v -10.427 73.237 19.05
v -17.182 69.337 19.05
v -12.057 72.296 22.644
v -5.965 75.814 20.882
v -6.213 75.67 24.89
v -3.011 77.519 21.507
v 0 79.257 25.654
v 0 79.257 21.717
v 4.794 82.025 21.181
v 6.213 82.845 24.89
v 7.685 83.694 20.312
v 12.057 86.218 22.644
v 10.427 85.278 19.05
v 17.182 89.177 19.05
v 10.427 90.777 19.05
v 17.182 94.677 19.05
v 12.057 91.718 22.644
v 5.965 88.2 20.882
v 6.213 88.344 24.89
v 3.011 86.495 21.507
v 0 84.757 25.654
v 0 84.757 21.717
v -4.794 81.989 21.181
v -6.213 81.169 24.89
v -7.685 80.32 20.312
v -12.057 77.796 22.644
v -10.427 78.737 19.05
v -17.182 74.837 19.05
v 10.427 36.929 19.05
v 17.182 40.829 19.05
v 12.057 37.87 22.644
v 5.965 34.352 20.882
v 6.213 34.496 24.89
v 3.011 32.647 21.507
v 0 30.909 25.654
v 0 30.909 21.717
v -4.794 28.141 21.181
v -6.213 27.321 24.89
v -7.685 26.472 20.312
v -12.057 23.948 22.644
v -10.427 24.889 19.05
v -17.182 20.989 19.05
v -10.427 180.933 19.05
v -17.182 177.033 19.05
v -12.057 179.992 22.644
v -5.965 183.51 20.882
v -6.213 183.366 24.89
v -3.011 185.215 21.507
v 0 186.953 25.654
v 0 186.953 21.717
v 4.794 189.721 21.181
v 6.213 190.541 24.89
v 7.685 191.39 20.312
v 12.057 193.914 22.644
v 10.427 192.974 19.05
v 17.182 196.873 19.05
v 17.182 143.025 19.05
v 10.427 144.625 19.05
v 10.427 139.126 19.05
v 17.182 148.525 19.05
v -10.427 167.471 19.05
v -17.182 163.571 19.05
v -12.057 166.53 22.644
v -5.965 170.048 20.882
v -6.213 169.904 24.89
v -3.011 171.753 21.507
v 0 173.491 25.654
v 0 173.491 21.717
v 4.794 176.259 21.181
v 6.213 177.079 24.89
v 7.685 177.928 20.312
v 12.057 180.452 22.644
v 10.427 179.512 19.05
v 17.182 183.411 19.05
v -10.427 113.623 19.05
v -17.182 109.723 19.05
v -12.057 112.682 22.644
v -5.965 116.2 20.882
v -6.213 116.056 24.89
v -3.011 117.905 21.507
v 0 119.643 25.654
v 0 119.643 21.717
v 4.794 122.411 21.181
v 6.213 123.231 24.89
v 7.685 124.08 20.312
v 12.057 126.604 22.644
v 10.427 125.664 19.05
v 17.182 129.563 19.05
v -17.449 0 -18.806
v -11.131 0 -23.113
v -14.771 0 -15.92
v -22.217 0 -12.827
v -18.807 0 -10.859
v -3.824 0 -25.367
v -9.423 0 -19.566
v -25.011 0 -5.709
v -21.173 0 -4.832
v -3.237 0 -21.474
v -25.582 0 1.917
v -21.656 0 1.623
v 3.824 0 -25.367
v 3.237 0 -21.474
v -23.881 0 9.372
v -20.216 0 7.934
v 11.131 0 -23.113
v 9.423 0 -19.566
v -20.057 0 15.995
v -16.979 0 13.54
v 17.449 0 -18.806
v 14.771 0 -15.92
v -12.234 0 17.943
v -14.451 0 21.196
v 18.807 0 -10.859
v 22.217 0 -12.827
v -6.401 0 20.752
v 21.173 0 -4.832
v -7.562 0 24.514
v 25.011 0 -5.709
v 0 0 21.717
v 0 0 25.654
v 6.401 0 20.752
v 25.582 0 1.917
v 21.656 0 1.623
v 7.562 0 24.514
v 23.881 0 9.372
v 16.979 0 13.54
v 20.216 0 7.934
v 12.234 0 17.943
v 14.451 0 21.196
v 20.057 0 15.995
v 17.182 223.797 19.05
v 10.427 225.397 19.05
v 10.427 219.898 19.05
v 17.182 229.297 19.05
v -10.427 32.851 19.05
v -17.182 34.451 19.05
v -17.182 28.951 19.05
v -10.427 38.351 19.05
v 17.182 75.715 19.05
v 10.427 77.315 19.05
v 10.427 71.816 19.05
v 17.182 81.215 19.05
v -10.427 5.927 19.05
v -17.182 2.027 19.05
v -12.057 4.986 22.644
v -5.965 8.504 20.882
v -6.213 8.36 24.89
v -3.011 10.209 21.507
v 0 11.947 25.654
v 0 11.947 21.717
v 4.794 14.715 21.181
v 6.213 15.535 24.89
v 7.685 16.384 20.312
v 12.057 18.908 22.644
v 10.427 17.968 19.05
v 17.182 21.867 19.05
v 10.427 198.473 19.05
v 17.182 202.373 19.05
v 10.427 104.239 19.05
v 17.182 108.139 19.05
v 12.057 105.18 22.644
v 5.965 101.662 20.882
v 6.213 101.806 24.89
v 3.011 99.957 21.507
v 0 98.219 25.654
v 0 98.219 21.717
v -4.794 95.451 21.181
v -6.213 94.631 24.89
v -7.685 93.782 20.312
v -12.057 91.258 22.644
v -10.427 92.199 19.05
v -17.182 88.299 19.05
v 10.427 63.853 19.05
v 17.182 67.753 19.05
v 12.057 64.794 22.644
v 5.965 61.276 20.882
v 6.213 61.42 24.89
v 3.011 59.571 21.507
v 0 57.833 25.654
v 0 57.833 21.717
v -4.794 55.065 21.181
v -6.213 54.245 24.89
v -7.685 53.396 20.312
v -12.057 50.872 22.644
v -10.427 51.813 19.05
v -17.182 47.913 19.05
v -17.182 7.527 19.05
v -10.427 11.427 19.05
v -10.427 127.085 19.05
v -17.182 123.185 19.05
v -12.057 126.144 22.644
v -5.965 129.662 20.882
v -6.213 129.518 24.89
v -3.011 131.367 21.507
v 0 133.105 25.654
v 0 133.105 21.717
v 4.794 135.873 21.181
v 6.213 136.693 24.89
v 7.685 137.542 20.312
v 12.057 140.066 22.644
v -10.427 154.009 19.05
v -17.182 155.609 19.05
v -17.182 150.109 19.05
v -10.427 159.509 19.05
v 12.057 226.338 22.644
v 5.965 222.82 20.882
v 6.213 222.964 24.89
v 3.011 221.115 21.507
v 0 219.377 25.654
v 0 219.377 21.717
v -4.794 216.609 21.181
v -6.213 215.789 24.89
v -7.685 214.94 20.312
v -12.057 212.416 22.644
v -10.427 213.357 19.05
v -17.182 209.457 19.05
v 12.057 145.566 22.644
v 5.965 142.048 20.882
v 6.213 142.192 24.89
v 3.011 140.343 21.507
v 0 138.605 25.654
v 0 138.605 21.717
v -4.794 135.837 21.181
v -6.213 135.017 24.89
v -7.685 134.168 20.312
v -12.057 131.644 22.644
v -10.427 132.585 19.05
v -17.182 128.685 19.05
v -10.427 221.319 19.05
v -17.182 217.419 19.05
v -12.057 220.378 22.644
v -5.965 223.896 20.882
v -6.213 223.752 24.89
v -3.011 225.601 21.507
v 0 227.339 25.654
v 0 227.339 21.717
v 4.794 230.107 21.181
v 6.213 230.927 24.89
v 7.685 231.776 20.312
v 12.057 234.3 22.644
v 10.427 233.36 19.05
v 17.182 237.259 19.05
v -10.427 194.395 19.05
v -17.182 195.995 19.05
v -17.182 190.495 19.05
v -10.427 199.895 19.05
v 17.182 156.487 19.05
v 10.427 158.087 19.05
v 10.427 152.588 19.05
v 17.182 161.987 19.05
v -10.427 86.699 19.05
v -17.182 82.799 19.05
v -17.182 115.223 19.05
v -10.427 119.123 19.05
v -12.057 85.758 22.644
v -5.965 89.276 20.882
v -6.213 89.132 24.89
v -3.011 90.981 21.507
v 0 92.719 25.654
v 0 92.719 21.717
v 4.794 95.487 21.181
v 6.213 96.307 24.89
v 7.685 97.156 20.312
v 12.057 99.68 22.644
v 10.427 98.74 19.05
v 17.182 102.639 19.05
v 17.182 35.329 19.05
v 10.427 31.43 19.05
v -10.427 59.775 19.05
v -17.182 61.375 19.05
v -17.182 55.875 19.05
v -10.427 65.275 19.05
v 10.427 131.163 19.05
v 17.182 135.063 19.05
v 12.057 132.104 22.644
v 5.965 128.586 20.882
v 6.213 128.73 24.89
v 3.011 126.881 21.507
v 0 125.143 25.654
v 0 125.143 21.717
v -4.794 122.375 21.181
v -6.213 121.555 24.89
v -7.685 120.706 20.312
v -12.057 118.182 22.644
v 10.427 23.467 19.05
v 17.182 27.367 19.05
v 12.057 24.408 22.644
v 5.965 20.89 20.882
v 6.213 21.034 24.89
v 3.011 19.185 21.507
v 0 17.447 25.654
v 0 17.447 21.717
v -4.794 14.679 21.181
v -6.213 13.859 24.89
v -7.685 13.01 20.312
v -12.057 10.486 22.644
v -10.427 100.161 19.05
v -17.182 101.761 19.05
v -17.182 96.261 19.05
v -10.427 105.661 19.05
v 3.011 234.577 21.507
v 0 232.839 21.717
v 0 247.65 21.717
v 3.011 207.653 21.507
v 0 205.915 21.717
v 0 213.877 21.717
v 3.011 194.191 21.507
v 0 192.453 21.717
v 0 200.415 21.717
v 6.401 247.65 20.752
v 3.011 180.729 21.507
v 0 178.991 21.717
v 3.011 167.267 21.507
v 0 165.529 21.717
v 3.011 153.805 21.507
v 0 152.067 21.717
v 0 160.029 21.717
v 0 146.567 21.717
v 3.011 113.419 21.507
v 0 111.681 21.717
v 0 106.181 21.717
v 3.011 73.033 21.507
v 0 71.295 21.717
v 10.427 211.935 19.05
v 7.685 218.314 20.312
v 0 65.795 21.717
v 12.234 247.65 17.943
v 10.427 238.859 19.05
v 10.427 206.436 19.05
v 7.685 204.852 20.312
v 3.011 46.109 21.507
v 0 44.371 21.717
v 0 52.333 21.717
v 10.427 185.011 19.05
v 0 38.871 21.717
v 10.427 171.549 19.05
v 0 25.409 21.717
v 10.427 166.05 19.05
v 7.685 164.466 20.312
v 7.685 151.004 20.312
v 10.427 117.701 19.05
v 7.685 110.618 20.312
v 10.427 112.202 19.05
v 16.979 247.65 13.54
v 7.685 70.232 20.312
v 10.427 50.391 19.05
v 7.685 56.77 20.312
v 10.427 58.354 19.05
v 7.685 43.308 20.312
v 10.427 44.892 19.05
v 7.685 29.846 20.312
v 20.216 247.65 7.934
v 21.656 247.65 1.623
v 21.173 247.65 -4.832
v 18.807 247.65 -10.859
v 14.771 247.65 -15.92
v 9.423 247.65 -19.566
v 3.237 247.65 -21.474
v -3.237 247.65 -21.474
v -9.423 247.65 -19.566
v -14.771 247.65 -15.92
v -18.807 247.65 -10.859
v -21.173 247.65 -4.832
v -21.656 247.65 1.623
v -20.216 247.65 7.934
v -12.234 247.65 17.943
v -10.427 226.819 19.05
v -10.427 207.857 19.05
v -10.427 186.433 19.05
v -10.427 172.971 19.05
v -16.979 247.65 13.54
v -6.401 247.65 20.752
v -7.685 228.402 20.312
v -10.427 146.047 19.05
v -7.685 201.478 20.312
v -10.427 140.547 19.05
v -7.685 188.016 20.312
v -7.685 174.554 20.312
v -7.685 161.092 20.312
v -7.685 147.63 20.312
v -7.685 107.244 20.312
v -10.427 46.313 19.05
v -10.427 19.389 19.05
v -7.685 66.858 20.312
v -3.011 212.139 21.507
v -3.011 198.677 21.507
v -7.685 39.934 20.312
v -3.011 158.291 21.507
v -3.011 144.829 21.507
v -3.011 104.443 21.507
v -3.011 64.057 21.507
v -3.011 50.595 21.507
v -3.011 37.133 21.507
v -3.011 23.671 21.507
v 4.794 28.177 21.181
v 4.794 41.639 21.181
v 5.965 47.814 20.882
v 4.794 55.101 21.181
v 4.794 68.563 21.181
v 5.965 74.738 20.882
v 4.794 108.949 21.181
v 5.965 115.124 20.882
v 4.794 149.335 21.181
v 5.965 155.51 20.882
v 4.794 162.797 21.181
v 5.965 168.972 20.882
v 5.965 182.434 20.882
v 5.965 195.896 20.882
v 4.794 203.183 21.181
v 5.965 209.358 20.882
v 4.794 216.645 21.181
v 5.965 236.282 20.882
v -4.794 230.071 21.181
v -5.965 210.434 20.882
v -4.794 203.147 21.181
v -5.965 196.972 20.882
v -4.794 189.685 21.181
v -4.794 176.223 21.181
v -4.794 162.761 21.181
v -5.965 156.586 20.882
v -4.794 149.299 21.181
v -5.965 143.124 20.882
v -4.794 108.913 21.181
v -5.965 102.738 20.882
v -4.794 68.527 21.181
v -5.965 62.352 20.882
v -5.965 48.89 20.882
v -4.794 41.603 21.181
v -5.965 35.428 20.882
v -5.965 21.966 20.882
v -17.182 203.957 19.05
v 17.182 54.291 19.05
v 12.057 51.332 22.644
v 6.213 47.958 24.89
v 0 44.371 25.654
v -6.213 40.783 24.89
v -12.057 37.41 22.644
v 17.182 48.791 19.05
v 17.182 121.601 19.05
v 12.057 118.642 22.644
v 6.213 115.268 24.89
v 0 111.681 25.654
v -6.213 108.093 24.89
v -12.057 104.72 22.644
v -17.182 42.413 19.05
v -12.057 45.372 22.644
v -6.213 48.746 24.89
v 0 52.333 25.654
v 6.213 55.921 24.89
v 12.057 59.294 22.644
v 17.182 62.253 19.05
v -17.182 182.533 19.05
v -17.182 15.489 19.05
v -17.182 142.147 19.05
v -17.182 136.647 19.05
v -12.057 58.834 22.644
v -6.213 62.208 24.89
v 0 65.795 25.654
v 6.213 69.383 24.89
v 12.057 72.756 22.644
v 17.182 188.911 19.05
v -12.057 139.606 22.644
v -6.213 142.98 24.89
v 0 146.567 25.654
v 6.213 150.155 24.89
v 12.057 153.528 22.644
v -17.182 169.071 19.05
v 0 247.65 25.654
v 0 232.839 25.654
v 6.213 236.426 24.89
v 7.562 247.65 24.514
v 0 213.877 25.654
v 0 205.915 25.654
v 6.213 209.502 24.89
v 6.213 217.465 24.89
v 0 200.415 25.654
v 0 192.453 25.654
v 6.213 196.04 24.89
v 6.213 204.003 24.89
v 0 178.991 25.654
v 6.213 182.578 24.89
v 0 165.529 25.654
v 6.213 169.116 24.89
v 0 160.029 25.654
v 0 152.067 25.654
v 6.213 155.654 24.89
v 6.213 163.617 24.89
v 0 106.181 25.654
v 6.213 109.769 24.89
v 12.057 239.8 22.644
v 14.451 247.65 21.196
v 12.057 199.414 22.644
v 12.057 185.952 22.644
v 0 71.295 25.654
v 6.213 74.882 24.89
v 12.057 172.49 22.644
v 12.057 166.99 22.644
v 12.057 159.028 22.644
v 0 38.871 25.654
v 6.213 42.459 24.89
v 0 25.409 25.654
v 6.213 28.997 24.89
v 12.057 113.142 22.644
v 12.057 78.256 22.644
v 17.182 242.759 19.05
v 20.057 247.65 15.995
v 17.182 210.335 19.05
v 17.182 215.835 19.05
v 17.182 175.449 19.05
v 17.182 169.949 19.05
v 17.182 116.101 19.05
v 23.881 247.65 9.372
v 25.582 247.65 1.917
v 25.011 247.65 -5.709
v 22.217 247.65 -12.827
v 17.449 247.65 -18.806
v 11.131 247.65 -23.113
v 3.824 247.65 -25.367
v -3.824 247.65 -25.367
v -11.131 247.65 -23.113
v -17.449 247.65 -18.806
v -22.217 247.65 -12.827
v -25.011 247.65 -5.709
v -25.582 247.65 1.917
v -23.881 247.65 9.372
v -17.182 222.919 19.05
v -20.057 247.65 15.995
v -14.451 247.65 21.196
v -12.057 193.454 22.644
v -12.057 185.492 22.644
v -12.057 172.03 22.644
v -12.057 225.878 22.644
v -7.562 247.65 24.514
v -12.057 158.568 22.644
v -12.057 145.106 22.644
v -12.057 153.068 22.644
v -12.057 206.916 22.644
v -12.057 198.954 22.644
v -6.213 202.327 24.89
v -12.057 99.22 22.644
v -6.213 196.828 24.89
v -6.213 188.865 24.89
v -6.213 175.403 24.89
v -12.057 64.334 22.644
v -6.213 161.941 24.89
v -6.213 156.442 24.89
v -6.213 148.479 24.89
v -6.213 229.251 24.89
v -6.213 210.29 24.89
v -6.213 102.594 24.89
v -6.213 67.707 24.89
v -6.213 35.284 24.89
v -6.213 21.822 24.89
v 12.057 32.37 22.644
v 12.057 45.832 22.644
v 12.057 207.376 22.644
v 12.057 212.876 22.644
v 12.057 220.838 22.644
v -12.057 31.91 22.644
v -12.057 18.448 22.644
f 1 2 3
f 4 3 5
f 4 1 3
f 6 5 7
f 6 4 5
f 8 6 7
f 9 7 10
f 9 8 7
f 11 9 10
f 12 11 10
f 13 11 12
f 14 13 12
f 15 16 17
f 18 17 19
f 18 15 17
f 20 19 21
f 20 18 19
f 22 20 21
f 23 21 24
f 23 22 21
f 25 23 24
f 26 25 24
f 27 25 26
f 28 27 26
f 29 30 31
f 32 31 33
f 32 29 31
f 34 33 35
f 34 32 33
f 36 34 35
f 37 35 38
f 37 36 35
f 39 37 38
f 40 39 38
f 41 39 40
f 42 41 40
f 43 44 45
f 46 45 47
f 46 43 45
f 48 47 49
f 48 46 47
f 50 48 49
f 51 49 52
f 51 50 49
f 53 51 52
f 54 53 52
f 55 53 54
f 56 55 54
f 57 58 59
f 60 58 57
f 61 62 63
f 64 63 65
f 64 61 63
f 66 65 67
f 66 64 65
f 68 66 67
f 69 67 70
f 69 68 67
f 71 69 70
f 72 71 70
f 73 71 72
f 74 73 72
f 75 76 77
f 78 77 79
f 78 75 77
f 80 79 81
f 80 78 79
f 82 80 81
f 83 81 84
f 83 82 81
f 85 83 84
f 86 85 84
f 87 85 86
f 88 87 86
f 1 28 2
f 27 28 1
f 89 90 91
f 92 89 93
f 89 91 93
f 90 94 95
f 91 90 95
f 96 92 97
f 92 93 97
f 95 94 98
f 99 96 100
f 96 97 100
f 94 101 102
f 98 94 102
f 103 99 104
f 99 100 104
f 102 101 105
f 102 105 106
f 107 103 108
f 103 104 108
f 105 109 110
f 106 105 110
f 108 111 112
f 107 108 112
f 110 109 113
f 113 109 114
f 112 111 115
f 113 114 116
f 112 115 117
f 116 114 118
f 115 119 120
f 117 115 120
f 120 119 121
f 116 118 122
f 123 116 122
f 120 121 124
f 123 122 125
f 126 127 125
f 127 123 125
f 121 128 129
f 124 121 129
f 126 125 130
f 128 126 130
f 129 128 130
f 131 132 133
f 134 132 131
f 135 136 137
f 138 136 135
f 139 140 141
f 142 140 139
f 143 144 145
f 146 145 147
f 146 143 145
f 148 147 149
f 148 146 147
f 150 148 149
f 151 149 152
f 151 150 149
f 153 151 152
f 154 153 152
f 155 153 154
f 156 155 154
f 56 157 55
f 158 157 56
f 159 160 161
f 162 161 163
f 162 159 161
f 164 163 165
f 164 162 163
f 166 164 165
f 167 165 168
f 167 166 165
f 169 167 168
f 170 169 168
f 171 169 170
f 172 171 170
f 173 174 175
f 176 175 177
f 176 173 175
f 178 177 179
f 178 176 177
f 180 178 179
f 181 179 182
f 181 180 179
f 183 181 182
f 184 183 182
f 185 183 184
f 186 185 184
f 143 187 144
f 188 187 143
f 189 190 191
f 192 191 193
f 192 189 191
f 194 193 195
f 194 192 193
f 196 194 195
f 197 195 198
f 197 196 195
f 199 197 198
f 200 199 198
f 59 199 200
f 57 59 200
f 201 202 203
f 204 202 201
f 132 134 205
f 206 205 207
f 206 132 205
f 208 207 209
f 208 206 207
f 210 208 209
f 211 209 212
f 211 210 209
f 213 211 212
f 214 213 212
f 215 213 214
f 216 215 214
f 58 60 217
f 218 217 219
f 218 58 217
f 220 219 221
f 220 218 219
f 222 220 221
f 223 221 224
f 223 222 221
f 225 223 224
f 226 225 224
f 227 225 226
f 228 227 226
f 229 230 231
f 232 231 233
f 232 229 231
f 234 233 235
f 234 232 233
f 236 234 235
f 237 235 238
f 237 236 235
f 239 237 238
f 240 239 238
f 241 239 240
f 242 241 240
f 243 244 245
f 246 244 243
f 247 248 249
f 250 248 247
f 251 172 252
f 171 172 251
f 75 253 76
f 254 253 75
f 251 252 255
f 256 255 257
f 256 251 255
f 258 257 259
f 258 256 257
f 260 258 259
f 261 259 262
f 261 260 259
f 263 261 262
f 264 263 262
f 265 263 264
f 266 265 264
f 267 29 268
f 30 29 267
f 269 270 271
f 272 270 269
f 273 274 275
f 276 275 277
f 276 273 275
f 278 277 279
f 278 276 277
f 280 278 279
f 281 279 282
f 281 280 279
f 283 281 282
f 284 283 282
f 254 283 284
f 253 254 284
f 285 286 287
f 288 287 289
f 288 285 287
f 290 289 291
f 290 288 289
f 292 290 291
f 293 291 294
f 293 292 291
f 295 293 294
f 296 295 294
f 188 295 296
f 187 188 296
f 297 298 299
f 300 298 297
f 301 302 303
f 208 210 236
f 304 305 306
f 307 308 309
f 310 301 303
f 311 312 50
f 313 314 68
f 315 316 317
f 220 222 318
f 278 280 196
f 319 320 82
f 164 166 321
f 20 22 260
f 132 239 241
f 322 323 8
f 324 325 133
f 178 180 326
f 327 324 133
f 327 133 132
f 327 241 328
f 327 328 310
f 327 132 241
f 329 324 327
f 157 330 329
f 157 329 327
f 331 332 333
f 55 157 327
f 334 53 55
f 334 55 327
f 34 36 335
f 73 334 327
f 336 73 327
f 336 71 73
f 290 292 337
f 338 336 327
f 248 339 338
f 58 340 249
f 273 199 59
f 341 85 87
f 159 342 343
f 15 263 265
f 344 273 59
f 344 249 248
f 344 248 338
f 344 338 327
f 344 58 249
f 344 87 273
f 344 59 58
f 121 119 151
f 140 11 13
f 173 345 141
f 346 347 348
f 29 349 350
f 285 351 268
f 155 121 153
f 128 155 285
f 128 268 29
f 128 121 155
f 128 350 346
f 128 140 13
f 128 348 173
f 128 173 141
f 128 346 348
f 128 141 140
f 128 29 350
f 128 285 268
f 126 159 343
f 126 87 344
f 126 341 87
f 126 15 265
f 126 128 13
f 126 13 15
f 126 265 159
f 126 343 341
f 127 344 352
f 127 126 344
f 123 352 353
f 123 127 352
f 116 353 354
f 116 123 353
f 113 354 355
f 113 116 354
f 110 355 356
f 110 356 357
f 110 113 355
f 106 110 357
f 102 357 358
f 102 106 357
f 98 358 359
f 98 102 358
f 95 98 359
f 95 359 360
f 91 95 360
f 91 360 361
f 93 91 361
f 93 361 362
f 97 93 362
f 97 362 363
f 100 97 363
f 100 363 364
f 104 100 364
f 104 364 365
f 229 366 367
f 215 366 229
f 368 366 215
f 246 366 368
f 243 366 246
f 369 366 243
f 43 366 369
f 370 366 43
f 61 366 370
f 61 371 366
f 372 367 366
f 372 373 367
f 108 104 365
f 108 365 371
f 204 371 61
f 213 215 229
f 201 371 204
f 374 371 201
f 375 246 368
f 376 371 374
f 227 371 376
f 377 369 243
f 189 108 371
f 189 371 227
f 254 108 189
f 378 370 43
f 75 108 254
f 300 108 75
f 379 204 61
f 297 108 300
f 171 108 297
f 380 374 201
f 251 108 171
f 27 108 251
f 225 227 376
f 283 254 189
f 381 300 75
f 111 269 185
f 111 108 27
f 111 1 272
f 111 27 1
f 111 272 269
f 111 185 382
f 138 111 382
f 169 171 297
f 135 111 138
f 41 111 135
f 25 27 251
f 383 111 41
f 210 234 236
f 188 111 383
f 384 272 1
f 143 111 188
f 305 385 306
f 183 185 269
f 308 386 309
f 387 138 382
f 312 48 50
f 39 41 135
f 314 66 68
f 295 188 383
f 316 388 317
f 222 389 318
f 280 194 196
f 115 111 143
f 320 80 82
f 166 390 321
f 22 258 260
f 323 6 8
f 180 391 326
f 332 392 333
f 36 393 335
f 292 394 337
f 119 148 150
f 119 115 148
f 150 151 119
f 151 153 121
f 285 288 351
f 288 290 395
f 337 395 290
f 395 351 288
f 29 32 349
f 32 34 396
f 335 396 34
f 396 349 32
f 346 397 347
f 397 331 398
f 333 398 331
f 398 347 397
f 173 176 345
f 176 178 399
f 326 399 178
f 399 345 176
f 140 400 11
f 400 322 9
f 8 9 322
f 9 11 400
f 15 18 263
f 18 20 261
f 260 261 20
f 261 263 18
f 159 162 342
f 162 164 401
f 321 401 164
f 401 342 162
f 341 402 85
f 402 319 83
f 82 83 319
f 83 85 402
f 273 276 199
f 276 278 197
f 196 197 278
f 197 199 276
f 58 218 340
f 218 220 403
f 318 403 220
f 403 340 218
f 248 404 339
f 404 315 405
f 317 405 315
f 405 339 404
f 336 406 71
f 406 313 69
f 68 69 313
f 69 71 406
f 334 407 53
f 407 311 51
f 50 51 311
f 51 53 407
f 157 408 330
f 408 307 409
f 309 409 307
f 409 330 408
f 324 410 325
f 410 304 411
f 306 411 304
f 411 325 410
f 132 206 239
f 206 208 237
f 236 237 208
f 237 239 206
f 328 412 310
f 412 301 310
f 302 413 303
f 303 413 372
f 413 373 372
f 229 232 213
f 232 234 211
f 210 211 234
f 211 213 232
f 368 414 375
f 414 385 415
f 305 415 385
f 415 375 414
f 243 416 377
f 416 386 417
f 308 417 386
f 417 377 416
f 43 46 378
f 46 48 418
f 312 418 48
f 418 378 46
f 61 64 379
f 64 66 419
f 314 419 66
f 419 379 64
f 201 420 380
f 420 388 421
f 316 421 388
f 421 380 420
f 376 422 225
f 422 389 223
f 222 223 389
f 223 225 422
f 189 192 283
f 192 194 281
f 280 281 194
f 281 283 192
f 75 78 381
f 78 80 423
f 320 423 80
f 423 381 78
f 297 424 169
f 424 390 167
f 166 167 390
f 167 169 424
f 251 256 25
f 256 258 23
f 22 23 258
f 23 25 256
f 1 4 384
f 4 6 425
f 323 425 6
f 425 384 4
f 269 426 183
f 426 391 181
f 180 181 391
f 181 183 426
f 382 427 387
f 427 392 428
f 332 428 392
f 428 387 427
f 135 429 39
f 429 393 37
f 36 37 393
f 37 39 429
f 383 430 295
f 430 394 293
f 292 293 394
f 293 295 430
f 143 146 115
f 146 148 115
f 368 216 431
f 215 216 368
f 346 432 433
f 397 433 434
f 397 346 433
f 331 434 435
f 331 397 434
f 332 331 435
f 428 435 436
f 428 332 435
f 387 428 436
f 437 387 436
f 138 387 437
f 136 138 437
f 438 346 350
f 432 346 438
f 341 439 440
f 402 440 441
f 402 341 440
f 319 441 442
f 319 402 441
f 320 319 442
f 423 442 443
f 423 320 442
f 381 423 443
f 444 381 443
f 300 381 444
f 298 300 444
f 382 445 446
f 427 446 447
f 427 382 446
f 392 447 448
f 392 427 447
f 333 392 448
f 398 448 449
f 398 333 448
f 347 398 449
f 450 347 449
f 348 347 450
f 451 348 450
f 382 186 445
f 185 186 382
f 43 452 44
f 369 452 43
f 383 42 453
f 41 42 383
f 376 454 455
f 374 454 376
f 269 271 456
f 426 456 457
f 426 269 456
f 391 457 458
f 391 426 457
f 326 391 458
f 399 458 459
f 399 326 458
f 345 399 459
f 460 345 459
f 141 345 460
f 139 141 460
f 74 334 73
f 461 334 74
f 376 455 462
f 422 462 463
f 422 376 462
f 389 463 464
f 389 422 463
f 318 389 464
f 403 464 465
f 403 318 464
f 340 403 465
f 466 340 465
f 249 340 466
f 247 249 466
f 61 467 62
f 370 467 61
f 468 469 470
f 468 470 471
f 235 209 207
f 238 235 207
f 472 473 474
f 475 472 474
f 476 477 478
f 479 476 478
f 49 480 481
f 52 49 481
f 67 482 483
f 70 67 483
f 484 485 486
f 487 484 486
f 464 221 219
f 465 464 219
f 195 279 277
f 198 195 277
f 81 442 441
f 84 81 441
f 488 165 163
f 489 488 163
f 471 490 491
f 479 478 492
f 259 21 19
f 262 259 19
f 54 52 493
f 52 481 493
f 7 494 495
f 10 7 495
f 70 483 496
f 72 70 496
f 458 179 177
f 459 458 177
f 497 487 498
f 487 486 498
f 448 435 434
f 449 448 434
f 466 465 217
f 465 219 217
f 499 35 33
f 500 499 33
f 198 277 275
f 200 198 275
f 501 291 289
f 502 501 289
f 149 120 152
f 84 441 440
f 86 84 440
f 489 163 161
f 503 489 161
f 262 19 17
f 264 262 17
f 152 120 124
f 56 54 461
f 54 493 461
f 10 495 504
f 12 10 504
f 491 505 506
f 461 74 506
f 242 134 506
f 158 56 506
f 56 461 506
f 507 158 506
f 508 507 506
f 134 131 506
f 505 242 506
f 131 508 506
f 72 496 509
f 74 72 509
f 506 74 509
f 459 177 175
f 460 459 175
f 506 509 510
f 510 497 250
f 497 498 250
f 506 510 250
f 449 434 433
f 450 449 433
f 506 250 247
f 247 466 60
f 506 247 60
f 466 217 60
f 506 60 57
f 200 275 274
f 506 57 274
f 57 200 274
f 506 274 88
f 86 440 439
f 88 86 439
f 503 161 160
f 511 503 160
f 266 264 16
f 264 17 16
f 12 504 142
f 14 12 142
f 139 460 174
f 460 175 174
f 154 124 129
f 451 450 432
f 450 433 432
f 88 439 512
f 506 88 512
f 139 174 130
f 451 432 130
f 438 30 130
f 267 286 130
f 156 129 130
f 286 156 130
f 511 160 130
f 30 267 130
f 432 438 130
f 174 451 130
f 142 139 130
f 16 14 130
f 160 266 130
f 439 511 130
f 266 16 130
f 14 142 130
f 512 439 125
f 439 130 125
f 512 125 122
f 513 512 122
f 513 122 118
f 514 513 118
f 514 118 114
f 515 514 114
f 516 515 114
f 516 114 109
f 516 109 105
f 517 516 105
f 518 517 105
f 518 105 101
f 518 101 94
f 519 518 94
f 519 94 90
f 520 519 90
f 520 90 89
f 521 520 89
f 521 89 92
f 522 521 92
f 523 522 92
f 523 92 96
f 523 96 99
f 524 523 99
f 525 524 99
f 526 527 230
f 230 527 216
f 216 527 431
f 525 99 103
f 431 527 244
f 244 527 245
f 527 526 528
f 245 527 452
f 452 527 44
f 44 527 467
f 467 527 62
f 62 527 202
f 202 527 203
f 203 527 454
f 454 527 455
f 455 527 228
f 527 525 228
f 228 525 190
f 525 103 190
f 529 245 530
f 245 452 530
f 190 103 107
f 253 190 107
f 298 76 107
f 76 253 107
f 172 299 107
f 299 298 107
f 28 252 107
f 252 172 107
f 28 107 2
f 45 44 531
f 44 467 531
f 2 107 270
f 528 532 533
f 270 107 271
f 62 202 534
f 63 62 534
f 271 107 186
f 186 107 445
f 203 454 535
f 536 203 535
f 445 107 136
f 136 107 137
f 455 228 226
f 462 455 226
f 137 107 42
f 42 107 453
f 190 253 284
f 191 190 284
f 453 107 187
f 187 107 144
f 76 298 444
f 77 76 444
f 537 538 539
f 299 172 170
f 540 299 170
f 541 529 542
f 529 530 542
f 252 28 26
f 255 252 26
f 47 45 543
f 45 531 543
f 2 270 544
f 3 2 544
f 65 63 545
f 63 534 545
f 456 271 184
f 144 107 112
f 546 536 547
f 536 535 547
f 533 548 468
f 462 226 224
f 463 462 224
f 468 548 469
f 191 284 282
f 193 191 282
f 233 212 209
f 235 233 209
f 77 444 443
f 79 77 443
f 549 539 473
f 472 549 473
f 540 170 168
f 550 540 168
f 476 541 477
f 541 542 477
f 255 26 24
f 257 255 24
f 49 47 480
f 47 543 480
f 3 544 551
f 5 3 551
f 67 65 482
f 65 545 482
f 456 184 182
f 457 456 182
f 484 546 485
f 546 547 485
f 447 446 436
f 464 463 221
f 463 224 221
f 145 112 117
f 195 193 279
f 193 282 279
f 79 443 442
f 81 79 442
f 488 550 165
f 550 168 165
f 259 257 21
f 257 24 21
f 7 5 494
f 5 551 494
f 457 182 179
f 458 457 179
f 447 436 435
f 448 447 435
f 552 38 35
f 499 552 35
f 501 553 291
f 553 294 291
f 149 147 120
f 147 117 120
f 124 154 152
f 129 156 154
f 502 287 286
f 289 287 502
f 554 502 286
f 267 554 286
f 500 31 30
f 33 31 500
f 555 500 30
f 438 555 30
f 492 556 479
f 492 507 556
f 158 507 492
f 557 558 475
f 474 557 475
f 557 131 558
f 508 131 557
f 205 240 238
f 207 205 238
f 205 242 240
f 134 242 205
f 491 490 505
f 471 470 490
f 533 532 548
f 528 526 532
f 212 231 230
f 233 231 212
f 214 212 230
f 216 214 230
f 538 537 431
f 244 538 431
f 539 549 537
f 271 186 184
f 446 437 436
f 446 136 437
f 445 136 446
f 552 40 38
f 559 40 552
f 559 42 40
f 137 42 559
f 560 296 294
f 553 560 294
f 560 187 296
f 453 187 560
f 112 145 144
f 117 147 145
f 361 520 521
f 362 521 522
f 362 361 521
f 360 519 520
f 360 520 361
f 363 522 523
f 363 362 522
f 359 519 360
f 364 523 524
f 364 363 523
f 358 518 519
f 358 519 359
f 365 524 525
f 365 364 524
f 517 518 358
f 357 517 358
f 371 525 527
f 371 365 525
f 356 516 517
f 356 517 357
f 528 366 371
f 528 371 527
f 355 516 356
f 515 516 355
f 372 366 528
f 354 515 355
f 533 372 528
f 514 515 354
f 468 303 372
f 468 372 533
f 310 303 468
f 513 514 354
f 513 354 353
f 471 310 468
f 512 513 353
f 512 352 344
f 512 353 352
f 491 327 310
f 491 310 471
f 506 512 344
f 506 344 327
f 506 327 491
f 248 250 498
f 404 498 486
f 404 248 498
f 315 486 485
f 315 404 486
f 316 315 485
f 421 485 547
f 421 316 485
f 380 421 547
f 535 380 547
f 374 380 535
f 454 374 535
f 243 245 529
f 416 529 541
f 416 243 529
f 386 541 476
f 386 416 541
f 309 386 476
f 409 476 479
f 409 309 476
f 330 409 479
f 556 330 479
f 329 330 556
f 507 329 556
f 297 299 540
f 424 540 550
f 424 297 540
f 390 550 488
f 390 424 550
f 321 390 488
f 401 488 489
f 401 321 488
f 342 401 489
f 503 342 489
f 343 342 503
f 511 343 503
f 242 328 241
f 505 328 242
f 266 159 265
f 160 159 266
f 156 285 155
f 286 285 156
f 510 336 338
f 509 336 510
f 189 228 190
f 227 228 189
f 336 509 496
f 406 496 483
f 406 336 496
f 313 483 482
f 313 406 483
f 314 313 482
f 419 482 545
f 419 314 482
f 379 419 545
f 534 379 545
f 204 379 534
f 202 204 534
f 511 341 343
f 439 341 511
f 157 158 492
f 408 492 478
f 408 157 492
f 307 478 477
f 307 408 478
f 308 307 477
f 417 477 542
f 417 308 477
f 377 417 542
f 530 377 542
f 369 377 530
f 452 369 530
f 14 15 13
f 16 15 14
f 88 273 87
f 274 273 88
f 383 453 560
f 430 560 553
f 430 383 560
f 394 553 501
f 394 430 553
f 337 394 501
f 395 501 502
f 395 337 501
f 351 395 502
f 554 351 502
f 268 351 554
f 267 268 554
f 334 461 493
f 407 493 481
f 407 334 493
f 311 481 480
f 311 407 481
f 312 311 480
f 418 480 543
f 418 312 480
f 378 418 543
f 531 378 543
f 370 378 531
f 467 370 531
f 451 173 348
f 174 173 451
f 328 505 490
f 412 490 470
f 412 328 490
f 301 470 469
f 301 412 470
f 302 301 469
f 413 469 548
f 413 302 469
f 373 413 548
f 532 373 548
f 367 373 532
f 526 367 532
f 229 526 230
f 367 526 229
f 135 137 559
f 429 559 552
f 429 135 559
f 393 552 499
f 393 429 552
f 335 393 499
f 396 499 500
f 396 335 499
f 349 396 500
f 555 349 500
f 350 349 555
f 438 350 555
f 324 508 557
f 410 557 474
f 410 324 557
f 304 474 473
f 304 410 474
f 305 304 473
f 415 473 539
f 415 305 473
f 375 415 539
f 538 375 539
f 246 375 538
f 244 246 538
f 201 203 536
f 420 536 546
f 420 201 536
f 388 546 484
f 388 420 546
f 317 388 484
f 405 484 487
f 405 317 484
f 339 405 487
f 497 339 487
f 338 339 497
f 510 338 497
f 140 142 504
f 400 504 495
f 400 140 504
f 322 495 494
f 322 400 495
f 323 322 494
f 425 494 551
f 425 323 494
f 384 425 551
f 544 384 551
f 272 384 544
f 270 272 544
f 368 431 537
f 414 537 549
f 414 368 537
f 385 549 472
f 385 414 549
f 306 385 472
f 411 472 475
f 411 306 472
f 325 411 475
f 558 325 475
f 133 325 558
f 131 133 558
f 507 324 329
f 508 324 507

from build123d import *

# Parameters (mm, degrees)
SKETCH1_R           = 25.654
SKETCH1_R_2         = 21.717
BOSS_EXTRUDE1_DEPTH = 247.65
CUT_EXTRUDE1_START  = 19.05
CUT_EXTRUDE1_DEPTH  = 12.7
LPATTERN1_COUNT     = 17
LPATTERN1_PITCH     = 13.462


with BuildPart() as part:
    # Sketch1 → Boss-Extrude1 (new body)
    with BuildSketch(Plane(origin=(0, 0, 0), x_dir=(1, 0, 0), z_dir=(0, 1, 0))):
        Circle(SKETCH1_R)
        Circle(SKETCH1_R_2, mode=Mode.SUBTRACT)
    extrude(amount=BOSS_EXTRUDE1_DEPTH)

    # Sketch2 → Cut-Extrude1 (cut)
    with BuildSketch(Plane.XY.offset(CUT_EXTRUDE1_START)):
        Polygon((-28.03525, 216.65249706), (-25.654, 212.528051074), (28.03525, 243.525554014), (25.654, 247.65), align=None)
    cut_extrude1 = extrude(amount=CUT_EXTRUDE1_DEPTH, mode=Mode.SUBTRACT)

    # LPattern1: Cut-Extrude1 ×17
    with Locations(*[(0, -i * LPATTERN1_PITCH, 0) for i in range(1, LPATTERN1_COUNT)]):
        add(cut_extrude1, mode=Mode.SUBTRACT)


solid = part.part
